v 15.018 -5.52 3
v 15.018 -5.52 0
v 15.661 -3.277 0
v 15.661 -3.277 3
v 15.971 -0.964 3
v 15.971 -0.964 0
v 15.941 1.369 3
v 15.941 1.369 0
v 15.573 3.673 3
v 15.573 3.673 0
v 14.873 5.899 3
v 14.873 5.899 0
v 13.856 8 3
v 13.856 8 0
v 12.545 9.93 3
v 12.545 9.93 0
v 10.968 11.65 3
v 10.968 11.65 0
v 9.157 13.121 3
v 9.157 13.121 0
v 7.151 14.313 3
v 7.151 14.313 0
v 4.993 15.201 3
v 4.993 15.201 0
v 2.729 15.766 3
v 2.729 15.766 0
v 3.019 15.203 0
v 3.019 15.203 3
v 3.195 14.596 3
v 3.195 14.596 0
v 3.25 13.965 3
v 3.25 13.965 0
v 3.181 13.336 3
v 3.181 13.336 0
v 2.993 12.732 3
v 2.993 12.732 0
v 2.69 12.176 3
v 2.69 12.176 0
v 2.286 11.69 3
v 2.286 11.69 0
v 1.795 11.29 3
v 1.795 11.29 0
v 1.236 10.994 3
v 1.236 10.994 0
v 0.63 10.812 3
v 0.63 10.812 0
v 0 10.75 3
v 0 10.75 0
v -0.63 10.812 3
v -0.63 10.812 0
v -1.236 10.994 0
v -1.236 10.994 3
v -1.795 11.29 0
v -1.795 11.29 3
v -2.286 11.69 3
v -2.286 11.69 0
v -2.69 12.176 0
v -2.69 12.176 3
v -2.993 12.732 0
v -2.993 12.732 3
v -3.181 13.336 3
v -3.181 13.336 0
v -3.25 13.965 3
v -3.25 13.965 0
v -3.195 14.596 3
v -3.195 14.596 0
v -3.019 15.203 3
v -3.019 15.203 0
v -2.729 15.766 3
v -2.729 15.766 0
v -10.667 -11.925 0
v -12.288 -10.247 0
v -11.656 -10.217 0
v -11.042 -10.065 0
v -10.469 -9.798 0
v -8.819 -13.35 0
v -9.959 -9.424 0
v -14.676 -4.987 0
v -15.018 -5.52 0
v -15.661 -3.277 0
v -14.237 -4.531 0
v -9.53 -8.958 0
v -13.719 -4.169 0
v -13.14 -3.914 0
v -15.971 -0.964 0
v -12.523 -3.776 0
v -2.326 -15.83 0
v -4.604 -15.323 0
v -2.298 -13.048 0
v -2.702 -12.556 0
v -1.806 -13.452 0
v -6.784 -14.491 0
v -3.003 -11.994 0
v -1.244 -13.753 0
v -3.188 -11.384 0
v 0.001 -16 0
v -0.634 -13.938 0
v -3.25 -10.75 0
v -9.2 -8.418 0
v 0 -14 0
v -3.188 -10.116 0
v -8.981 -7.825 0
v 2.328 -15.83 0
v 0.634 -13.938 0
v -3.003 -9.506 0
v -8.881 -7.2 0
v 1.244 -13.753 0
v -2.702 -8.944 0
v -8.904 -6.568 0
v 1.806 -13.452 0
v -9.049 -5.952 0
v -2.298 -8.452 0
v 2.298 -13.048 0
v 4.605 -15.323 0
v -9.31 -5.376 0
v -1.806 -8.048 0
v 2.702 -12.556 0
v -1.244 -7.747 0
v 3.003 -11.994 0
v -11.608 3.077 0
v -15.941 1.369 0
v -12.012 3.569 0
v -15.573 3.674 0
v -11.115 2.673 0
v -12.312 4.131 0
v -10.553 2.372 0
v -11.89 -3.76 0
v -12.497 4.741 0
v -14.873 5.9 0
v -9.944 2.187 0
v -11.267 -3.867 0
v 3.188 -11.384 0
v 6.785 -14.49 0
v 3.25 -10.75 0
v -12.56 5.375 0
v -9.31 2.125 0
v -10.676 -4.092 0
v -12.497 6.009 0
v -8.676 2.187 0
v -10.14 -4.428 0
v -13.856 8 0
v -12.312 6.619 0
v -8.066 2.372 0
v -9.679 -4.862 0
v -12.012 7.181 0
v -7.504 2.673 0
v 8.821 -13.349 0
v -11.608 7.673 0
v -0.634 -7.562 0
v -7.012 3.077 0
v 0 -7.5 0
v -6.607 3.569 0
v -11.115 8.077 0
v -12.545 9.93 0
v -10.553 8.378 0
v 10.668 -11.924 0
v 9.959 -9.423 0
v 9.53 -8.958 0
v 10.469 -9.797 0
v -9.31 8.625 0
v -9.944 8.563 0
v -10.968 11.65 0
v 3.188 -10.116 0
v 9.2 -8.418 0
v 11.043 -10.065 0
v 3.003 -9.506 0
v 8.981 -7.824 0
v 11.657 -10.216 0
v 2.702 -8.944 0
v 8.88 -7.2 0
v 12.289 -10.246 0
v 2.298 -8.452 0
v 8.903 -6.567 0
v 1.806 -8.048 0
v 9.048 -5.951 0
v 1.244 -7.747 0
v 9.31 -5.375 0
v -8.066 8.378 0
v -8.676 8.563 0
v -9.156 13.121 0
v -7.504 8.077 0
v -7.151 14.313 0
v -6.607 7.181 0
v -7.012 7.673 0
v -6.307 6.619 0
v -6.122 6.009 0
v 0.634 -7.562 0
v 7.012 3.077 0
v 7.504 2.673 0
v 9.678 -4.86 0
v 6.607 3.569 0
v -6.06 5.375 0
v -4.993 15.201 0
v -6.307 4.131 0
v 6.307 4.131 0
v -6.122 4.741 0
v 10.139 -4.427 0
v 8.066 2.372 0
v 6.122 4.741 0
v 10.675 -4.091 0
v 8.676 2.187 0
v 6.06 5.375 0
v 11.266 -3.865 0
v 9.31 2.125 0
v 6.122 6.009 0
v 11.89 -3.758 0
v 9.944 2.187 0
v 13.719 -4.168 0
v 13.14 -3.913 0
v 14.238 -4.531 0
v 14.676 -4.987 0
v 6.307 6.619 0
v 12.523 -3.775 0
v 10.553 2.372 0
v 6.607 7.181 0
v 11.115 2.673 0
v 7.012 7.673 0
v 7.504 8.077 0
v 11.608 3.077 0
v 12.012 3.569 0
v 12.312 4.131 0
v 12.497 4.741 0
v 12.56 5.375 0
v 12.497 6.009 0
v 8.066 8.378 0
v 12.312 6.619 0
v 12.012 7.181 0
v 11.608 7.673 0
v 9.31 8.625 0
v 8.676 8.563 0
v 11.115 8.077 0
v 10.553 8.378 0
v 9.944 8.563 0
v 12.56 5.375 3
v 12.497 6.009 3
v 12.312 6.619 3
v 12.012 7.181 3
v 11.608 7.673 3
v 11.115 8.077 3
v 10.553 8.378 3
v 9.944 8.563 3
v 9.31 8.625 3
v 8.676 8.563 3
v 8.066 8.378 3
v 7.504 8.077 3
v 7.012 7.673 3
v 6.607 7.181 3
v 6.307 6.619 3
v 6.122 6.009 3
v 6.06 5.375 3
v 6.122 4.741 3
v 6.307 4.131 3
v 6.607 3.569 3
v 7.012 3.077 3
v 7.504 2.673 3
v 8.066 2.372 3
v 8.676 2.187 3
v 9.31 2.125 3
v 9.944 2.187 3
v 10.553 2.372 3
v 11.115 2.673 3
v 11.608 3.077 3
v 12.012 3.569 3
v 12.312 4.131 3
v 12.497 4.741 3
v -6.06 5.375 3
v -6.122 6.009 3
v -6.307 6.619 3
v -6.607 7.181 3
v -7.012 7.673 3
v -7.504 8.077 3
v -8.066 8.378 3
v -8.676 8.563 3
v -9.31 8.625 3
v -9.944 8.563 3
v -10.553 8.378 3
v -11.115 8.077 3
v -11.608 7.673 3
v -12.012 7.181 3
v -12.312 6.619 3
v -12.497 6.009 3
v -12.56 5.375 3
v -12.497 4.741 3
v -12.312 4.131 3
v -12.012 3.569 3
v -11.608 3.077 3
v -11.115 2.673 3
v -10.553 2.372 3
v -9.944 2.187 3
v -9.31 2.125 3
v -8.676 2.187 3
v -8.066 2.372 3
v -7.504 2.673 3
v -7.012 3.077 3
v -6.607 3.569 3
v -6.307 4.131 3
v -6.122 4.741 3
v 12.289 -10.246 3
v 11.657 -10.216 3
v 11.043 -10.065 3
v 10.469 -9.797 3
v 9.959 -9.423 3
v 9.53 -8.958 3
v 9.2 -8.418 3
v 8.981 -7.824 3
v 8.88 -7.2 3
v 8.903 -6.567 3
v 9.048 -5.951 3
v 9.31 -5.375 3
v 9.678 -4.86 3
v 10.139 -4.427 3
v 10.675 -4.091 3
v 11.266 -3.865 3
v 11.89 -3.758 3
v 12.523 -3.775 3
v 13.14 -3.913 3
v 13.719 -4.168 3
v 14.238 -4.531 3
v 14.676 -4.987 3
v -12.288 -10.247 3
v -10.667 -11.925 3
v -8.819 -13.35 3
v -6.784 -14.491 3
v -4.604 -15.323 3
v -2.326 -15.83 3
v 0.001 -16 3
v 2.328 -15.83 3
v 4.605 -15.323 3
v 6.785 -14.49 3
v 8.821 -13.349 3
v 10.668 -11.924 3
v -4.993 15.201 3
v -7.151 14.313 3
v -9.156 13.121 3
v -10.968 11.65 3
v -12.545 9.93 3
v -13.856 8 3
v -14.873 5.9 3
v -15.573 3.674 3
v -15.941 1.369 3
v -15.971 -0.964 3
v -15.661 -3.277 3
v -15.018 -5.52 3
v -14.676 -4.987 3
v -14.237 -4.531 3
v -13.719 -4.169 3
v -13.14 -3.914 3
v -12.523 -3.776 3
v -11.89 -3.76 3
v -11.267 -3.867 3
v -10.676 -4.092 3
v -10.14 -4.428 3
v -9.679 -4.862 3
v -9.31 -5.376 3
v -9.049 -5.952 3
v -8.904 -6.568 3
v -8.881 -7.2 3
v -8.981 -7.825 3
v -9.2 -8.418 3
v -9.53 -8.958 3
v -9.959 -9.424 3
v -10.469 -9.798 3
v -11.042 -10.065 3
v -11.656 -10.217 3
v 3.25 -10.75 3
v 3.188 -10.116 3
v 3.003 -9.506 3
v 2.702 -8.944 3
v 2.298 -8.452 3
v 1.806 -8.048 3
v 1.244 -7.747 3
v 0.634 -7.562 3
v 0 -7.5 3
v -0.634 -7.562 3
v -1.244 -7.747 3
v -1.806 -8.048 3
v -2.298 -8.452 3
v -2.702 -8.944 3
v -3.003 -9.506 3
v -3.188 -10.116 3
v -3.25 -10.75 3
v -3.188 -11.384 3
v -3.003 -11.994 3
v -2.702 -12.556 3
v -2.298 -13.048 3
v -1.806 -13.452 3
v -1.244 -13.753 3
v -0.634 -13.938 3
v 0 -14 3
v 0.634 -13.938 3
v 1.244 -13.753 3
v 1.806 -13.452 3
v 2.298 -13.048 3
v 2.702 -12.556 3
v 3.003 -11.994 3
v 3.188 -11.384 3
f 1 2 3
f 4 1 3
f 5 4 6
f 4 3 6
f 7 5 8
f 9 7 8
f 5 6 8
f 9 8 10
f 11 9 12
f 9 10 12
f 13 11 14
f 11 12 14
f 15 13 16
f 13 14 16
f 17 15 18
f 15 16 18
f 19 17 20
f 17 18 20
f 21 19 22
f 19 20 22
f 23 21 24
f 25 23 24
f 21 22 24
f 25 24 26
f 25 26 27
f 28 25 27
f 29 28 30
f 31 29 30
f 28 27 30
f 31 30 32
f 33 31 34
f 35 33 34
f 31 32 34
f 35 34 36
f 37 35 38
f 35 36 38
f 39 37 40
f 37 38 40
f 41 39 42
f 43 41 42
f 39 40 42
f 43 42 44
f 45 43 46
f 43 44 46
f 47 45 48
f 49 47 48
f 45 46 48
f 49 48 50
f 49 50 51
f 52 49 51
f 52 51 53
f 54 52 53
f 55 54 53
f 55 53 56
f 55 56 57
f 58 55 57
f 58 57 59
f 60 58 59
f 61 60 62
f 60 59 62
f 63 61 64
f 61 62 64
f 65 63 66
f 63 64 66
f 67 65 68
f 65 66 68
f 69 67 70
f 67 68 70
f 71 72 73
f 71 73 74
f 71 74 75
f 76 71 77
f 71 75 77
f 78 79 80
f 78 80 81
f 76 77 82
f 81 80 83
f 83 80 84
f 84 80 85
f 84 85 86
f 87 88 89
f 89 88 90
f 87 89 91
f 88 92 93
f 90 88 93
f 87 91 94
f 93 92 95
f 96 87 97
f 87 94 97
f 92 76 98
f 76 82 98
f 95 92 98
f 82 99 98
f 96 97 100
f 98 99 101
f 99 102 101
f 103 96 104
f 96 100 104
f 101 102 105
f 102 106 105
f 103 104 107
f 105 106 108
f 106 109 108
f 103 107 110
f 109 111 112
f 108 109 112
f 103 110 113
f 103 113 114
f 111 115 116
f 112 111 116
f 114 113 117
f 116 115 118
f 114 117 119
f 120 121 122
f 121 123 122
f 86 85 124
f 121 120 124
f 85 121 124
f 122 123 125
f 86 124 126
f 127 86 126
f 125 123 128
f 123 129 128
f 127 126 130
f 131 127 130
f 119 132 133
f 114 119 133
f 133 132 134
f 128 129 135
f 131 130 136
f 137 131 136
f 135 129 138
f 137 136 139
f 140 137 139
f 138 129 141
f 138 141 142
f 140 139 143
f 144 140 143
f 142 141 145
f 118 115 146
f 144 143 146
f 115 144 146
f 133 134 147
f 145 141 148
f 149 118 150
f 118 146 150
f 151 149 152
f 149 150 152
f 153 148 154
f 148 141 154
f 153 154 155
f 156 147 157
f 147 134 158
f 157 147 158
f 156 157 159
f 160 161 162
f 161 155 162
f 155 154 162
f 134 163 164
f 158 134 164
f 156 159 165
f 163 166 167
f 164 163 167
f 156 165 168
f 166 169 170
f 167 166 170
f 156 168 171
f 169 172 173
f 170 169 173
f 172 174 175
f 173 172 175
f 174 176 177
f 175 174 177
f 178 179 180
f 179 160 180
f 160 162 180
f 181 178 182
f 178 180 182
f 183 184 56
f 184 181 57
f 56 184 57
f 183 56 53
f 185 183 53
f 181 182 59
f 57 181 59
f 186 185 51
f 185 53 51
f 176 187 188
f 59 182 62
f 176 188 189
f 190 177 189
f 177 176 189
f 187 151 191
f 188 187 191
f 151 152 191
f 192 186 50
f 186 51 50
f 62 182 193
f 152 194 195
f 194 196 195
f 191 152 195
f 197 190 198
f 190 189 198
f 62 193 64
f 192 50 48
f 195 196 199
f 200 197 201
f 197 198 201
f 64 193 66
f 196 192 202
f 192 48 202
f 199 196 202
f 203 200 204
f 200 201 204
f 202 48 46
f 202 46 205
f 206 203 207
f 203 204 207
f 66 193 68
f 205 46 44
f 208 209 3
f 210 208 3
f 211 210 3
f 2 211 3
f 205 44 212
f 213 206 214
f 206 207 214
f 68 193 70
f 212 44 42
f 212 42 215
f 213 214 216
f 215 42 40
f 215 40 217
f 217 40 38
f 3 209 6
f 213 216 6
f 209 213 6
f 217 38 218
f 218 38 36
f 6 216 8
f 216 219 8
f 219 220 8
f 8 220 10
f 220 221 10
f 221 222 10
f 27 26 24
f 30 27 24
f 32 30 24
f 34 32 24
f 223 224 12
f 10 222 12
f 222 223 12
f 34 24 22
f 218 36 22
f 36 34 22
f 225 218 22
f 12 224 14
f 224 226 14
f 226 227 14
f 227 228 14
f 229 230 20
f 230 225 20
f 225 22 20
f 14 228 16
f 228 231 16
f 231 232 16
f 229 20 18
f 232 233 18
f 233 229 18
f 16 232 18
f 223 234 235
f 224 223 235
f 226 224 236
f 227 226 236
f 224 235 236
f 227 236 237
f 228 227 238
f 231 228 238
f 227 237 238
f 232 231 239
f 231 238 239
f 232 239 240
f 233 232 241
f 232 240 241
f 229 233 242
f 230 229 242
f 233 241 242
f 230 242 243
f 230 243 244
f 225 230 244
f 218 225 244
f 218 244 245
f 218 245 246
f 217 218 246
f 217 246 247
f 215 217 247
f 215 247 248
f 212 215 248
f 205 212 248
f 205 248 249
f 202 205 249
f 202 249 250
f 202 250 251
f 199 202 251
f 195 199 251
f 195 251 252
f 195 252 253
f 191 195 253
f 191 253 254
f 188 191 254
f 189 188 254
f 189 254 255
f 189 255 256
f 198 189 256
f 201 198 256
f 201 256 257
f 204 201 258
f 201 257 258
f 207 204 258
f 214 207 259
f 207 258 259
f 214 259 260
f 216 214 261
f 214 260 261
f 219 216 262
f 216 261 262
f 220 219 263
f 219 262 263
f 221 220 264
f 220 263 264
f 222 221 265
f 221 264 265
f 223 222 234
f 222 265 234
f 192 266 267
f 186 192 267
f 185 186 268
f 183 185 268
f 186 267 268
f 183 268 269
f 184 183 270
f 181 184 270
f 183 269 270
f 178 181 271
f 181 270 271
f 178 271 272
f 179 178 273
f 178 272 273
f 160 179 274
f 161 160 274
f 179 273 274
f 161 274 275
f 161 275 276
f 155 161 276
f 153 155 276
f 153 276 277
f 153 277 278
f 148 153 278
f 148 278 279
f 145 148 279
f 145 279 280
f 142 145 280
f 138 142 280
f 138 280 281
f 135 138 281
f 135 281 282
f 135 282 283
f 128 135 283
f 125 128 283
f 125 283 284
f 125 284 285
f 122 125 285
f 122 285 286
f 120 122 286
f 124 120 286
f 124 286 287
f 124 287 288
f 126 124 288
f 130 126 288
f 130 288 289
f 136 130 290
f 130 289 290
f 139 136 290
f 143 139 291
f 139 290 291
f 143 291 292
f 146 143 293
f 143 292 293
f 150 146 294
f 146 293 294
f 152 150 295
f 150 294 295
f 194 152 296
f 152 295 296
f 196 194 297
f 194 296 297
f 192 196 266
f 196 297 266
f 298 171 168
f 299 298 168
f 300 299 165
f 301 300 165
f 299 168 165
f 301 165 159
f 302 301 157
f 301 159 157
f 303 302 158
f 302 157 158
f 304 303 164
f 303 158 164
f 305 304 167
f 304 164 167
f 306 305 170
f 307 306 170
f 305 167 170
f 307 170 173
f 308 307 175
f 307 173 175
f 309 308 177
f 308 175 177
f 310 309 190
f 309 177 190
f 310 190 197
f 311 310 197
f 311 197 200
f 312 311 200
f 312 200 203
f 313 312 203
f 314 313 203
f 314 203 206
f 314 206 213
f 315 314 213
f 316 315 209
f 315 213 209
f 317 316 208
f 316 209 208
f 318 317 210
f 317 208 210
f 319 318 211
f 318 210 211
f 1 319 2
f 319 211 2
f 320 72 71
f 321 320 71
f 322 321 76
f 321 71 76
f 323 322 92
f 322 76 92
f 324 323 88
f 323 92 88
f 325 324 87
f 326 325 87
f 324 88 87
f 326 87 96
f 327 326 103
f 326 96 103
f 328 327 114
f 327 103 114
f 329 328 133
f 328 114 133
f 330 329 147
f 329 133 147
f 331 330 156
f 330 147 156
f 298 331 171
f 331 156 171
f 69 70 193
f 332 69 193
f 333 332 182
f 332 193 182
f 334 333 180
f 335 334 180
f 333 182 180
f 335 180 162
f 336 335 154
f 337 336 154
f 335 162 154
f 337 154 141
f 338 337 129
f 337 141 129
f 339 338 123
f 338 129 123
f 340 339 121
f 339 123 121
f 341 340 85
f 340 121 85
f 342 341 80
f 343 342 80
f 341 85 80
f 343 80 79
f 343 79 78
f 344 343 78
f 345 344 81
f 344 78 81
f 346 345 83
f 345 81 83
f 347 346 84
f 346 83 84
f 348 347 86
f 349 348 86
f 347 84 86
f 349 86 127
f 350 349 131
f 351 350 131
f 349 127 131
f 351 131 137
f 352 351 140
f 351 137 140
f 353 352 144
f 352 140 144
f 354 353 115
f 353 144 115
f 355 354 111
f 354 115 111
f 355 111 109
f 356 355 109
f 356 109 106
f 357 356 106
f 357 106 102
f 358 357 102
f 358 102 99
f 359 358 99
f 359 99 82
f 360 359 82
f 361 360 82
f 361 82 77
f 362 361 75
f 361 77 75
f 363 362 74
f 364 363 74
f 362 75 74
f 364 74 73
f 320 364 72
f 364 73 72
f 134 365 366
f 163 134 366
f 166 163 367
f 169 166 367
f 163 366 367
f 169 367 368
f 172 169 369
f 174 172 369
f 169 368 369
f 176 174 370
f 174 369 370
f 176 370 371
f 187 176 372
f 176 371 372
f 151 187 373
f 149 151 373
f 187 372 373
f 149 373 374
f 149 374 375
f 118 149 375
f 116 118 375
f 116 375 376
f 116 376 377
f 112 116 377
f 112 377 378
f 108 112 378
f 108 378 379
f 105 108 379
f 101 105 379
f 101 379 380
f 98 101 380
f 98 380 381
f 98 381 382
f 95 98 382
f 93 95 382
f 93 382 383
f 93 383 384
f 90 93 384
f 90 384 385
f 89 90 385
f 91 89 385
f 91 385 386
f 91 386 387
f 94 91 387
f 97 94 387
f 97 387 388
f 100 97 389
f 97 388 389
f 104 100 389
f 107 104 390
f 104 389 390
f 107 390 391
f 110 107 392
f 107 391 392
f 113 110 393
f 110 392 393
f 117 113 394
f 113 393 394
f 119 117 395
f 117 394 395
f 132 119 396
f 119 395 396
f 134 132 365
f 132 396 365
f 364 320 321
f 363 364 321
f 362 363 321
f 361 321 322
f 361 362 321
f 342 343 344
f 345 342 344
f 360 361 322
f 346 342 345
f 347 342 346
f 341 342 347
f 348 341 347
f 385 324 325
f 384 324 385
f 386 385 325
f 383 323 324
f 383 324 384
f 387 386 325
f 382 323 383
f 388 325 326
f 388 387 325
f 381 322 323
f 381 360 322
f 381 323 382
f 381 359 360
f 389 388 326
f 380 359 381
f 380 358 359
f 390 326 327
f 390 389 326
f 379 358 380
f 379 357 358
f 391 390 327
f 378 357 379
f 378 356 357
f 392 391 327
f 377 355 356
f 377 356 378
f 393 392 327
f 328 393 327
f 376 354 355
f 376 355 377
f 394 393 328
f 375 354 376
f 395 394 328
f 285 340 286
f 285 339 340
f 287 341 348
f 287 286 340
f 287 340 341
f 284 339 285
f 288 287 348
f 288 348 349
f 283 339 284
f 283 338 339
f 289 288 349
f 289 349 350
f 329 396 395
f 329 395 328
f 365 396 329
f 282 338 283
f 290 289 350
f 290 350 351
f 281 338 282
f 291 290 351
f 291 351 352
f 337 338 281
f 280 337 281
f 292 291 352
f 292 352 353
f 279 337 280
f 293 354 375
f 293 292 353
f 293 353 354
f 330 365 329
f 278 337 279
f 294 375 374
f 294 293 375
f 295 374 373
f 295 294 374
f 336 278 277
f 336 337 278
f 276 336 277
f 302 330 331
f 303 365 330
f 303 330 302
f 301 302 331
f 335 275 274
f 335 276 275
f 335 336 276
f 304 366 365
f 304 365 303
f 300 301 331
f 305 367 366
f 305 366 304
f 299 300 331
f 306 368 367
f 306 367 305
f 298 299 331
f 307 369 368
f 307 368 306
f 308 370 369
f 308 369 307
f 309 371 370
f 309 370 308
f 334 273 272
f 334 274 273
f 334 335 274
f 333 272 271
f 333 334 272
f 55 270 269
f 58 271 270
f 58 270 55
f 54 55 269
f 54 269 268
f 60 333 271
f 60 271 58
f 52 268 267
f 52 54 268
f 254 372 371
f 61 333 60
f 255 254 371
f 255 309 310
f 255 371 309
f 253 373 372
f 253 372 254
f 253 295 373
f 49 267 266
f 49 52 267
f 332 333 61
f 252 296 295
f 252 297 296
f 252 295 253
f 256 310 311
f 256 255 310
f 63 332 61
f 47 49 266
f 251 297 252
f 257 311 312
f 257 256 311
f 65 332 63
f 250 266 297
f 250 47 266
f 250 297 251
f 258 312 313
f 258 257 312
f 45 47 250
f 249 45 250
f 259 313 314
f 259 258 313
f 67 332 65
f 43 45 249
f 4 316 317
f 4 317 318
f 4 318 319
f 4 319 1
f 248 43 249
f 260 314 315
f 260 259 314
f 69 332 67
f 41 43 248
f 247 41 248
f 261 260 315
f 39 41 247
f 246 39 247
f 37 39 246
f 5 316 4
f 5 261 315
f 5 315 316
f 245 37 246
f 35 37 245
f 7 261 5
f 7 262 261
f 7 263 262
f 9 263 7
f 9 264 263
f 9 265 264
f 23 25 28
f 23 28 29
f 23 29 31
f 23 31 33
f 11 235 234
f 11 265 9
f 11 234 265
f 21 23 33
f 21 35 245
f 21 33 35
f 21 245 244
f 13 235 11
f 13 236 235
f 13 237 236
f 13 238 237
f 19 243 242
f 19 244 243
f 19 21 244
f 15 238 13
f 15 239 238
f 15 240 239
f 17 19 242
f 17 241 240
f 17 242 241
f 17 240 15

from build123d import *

# Parameters (mm, degrees)
BOSS_EXTRU_2_DEPTH      = 3
ESQUISSE2_R             = 3.25
ENL_V_MAT_EXTRU_1_DEPTH = 10


with BuildPart() as part:
    # Esquisse1 → Boss.-Extru.2 (new body)
    with BuildSketch(Plane.XY):
        with BuildLine():
            ThreePointArc((-12.288149304, -10.247018429), (0.000780623, -15.999999981), (12.289149128, -10.245819328))
            ThreePointArc((12.289149128, -10.245819328), (9.309773091, -5.375), (15.017714385, -5.519805672))
            ThreePointArc((15.017714385, -5.519805672), (13.856406461, 8), (2.728565257, 15.765625))
            ThreePointArc((2.728565257, 15.765625), (0, 10.75), (-2.728565257, 15.765625))
            ThreePointArc((-2.728565257, 15.765625), (-13.856384318, 8.000038352), (-15.01774494, -5.519722539))
            ThreePointArc((-15.01774494, -5.519722539), (-9.310492225, -5.375986513), (-12.288149304, -10.247018429))
        make_face()
    extrude(amount=BOSS_EXTRU_2_DEPTH)

    # Esquisse2 → Enlèv. mat.-Extru.1 (cut)
    with BuildSketch(Plane.XY.offset(3)):
        with Locations((-9.309773091, 5.375)):
            Circle(ESQUISSE2_R)
        with Locations((9.309773091, 5.375)):
            Circle(ESQUISSE2_R)
        with Locations((0, -10.75)):
            Circle(ESQUISSE2_R)
    extrude(amount=-ENL_V_MAT_EXTRU_1_DEPTH, mode=Mode.SUBTRACT)


solid = part.part
